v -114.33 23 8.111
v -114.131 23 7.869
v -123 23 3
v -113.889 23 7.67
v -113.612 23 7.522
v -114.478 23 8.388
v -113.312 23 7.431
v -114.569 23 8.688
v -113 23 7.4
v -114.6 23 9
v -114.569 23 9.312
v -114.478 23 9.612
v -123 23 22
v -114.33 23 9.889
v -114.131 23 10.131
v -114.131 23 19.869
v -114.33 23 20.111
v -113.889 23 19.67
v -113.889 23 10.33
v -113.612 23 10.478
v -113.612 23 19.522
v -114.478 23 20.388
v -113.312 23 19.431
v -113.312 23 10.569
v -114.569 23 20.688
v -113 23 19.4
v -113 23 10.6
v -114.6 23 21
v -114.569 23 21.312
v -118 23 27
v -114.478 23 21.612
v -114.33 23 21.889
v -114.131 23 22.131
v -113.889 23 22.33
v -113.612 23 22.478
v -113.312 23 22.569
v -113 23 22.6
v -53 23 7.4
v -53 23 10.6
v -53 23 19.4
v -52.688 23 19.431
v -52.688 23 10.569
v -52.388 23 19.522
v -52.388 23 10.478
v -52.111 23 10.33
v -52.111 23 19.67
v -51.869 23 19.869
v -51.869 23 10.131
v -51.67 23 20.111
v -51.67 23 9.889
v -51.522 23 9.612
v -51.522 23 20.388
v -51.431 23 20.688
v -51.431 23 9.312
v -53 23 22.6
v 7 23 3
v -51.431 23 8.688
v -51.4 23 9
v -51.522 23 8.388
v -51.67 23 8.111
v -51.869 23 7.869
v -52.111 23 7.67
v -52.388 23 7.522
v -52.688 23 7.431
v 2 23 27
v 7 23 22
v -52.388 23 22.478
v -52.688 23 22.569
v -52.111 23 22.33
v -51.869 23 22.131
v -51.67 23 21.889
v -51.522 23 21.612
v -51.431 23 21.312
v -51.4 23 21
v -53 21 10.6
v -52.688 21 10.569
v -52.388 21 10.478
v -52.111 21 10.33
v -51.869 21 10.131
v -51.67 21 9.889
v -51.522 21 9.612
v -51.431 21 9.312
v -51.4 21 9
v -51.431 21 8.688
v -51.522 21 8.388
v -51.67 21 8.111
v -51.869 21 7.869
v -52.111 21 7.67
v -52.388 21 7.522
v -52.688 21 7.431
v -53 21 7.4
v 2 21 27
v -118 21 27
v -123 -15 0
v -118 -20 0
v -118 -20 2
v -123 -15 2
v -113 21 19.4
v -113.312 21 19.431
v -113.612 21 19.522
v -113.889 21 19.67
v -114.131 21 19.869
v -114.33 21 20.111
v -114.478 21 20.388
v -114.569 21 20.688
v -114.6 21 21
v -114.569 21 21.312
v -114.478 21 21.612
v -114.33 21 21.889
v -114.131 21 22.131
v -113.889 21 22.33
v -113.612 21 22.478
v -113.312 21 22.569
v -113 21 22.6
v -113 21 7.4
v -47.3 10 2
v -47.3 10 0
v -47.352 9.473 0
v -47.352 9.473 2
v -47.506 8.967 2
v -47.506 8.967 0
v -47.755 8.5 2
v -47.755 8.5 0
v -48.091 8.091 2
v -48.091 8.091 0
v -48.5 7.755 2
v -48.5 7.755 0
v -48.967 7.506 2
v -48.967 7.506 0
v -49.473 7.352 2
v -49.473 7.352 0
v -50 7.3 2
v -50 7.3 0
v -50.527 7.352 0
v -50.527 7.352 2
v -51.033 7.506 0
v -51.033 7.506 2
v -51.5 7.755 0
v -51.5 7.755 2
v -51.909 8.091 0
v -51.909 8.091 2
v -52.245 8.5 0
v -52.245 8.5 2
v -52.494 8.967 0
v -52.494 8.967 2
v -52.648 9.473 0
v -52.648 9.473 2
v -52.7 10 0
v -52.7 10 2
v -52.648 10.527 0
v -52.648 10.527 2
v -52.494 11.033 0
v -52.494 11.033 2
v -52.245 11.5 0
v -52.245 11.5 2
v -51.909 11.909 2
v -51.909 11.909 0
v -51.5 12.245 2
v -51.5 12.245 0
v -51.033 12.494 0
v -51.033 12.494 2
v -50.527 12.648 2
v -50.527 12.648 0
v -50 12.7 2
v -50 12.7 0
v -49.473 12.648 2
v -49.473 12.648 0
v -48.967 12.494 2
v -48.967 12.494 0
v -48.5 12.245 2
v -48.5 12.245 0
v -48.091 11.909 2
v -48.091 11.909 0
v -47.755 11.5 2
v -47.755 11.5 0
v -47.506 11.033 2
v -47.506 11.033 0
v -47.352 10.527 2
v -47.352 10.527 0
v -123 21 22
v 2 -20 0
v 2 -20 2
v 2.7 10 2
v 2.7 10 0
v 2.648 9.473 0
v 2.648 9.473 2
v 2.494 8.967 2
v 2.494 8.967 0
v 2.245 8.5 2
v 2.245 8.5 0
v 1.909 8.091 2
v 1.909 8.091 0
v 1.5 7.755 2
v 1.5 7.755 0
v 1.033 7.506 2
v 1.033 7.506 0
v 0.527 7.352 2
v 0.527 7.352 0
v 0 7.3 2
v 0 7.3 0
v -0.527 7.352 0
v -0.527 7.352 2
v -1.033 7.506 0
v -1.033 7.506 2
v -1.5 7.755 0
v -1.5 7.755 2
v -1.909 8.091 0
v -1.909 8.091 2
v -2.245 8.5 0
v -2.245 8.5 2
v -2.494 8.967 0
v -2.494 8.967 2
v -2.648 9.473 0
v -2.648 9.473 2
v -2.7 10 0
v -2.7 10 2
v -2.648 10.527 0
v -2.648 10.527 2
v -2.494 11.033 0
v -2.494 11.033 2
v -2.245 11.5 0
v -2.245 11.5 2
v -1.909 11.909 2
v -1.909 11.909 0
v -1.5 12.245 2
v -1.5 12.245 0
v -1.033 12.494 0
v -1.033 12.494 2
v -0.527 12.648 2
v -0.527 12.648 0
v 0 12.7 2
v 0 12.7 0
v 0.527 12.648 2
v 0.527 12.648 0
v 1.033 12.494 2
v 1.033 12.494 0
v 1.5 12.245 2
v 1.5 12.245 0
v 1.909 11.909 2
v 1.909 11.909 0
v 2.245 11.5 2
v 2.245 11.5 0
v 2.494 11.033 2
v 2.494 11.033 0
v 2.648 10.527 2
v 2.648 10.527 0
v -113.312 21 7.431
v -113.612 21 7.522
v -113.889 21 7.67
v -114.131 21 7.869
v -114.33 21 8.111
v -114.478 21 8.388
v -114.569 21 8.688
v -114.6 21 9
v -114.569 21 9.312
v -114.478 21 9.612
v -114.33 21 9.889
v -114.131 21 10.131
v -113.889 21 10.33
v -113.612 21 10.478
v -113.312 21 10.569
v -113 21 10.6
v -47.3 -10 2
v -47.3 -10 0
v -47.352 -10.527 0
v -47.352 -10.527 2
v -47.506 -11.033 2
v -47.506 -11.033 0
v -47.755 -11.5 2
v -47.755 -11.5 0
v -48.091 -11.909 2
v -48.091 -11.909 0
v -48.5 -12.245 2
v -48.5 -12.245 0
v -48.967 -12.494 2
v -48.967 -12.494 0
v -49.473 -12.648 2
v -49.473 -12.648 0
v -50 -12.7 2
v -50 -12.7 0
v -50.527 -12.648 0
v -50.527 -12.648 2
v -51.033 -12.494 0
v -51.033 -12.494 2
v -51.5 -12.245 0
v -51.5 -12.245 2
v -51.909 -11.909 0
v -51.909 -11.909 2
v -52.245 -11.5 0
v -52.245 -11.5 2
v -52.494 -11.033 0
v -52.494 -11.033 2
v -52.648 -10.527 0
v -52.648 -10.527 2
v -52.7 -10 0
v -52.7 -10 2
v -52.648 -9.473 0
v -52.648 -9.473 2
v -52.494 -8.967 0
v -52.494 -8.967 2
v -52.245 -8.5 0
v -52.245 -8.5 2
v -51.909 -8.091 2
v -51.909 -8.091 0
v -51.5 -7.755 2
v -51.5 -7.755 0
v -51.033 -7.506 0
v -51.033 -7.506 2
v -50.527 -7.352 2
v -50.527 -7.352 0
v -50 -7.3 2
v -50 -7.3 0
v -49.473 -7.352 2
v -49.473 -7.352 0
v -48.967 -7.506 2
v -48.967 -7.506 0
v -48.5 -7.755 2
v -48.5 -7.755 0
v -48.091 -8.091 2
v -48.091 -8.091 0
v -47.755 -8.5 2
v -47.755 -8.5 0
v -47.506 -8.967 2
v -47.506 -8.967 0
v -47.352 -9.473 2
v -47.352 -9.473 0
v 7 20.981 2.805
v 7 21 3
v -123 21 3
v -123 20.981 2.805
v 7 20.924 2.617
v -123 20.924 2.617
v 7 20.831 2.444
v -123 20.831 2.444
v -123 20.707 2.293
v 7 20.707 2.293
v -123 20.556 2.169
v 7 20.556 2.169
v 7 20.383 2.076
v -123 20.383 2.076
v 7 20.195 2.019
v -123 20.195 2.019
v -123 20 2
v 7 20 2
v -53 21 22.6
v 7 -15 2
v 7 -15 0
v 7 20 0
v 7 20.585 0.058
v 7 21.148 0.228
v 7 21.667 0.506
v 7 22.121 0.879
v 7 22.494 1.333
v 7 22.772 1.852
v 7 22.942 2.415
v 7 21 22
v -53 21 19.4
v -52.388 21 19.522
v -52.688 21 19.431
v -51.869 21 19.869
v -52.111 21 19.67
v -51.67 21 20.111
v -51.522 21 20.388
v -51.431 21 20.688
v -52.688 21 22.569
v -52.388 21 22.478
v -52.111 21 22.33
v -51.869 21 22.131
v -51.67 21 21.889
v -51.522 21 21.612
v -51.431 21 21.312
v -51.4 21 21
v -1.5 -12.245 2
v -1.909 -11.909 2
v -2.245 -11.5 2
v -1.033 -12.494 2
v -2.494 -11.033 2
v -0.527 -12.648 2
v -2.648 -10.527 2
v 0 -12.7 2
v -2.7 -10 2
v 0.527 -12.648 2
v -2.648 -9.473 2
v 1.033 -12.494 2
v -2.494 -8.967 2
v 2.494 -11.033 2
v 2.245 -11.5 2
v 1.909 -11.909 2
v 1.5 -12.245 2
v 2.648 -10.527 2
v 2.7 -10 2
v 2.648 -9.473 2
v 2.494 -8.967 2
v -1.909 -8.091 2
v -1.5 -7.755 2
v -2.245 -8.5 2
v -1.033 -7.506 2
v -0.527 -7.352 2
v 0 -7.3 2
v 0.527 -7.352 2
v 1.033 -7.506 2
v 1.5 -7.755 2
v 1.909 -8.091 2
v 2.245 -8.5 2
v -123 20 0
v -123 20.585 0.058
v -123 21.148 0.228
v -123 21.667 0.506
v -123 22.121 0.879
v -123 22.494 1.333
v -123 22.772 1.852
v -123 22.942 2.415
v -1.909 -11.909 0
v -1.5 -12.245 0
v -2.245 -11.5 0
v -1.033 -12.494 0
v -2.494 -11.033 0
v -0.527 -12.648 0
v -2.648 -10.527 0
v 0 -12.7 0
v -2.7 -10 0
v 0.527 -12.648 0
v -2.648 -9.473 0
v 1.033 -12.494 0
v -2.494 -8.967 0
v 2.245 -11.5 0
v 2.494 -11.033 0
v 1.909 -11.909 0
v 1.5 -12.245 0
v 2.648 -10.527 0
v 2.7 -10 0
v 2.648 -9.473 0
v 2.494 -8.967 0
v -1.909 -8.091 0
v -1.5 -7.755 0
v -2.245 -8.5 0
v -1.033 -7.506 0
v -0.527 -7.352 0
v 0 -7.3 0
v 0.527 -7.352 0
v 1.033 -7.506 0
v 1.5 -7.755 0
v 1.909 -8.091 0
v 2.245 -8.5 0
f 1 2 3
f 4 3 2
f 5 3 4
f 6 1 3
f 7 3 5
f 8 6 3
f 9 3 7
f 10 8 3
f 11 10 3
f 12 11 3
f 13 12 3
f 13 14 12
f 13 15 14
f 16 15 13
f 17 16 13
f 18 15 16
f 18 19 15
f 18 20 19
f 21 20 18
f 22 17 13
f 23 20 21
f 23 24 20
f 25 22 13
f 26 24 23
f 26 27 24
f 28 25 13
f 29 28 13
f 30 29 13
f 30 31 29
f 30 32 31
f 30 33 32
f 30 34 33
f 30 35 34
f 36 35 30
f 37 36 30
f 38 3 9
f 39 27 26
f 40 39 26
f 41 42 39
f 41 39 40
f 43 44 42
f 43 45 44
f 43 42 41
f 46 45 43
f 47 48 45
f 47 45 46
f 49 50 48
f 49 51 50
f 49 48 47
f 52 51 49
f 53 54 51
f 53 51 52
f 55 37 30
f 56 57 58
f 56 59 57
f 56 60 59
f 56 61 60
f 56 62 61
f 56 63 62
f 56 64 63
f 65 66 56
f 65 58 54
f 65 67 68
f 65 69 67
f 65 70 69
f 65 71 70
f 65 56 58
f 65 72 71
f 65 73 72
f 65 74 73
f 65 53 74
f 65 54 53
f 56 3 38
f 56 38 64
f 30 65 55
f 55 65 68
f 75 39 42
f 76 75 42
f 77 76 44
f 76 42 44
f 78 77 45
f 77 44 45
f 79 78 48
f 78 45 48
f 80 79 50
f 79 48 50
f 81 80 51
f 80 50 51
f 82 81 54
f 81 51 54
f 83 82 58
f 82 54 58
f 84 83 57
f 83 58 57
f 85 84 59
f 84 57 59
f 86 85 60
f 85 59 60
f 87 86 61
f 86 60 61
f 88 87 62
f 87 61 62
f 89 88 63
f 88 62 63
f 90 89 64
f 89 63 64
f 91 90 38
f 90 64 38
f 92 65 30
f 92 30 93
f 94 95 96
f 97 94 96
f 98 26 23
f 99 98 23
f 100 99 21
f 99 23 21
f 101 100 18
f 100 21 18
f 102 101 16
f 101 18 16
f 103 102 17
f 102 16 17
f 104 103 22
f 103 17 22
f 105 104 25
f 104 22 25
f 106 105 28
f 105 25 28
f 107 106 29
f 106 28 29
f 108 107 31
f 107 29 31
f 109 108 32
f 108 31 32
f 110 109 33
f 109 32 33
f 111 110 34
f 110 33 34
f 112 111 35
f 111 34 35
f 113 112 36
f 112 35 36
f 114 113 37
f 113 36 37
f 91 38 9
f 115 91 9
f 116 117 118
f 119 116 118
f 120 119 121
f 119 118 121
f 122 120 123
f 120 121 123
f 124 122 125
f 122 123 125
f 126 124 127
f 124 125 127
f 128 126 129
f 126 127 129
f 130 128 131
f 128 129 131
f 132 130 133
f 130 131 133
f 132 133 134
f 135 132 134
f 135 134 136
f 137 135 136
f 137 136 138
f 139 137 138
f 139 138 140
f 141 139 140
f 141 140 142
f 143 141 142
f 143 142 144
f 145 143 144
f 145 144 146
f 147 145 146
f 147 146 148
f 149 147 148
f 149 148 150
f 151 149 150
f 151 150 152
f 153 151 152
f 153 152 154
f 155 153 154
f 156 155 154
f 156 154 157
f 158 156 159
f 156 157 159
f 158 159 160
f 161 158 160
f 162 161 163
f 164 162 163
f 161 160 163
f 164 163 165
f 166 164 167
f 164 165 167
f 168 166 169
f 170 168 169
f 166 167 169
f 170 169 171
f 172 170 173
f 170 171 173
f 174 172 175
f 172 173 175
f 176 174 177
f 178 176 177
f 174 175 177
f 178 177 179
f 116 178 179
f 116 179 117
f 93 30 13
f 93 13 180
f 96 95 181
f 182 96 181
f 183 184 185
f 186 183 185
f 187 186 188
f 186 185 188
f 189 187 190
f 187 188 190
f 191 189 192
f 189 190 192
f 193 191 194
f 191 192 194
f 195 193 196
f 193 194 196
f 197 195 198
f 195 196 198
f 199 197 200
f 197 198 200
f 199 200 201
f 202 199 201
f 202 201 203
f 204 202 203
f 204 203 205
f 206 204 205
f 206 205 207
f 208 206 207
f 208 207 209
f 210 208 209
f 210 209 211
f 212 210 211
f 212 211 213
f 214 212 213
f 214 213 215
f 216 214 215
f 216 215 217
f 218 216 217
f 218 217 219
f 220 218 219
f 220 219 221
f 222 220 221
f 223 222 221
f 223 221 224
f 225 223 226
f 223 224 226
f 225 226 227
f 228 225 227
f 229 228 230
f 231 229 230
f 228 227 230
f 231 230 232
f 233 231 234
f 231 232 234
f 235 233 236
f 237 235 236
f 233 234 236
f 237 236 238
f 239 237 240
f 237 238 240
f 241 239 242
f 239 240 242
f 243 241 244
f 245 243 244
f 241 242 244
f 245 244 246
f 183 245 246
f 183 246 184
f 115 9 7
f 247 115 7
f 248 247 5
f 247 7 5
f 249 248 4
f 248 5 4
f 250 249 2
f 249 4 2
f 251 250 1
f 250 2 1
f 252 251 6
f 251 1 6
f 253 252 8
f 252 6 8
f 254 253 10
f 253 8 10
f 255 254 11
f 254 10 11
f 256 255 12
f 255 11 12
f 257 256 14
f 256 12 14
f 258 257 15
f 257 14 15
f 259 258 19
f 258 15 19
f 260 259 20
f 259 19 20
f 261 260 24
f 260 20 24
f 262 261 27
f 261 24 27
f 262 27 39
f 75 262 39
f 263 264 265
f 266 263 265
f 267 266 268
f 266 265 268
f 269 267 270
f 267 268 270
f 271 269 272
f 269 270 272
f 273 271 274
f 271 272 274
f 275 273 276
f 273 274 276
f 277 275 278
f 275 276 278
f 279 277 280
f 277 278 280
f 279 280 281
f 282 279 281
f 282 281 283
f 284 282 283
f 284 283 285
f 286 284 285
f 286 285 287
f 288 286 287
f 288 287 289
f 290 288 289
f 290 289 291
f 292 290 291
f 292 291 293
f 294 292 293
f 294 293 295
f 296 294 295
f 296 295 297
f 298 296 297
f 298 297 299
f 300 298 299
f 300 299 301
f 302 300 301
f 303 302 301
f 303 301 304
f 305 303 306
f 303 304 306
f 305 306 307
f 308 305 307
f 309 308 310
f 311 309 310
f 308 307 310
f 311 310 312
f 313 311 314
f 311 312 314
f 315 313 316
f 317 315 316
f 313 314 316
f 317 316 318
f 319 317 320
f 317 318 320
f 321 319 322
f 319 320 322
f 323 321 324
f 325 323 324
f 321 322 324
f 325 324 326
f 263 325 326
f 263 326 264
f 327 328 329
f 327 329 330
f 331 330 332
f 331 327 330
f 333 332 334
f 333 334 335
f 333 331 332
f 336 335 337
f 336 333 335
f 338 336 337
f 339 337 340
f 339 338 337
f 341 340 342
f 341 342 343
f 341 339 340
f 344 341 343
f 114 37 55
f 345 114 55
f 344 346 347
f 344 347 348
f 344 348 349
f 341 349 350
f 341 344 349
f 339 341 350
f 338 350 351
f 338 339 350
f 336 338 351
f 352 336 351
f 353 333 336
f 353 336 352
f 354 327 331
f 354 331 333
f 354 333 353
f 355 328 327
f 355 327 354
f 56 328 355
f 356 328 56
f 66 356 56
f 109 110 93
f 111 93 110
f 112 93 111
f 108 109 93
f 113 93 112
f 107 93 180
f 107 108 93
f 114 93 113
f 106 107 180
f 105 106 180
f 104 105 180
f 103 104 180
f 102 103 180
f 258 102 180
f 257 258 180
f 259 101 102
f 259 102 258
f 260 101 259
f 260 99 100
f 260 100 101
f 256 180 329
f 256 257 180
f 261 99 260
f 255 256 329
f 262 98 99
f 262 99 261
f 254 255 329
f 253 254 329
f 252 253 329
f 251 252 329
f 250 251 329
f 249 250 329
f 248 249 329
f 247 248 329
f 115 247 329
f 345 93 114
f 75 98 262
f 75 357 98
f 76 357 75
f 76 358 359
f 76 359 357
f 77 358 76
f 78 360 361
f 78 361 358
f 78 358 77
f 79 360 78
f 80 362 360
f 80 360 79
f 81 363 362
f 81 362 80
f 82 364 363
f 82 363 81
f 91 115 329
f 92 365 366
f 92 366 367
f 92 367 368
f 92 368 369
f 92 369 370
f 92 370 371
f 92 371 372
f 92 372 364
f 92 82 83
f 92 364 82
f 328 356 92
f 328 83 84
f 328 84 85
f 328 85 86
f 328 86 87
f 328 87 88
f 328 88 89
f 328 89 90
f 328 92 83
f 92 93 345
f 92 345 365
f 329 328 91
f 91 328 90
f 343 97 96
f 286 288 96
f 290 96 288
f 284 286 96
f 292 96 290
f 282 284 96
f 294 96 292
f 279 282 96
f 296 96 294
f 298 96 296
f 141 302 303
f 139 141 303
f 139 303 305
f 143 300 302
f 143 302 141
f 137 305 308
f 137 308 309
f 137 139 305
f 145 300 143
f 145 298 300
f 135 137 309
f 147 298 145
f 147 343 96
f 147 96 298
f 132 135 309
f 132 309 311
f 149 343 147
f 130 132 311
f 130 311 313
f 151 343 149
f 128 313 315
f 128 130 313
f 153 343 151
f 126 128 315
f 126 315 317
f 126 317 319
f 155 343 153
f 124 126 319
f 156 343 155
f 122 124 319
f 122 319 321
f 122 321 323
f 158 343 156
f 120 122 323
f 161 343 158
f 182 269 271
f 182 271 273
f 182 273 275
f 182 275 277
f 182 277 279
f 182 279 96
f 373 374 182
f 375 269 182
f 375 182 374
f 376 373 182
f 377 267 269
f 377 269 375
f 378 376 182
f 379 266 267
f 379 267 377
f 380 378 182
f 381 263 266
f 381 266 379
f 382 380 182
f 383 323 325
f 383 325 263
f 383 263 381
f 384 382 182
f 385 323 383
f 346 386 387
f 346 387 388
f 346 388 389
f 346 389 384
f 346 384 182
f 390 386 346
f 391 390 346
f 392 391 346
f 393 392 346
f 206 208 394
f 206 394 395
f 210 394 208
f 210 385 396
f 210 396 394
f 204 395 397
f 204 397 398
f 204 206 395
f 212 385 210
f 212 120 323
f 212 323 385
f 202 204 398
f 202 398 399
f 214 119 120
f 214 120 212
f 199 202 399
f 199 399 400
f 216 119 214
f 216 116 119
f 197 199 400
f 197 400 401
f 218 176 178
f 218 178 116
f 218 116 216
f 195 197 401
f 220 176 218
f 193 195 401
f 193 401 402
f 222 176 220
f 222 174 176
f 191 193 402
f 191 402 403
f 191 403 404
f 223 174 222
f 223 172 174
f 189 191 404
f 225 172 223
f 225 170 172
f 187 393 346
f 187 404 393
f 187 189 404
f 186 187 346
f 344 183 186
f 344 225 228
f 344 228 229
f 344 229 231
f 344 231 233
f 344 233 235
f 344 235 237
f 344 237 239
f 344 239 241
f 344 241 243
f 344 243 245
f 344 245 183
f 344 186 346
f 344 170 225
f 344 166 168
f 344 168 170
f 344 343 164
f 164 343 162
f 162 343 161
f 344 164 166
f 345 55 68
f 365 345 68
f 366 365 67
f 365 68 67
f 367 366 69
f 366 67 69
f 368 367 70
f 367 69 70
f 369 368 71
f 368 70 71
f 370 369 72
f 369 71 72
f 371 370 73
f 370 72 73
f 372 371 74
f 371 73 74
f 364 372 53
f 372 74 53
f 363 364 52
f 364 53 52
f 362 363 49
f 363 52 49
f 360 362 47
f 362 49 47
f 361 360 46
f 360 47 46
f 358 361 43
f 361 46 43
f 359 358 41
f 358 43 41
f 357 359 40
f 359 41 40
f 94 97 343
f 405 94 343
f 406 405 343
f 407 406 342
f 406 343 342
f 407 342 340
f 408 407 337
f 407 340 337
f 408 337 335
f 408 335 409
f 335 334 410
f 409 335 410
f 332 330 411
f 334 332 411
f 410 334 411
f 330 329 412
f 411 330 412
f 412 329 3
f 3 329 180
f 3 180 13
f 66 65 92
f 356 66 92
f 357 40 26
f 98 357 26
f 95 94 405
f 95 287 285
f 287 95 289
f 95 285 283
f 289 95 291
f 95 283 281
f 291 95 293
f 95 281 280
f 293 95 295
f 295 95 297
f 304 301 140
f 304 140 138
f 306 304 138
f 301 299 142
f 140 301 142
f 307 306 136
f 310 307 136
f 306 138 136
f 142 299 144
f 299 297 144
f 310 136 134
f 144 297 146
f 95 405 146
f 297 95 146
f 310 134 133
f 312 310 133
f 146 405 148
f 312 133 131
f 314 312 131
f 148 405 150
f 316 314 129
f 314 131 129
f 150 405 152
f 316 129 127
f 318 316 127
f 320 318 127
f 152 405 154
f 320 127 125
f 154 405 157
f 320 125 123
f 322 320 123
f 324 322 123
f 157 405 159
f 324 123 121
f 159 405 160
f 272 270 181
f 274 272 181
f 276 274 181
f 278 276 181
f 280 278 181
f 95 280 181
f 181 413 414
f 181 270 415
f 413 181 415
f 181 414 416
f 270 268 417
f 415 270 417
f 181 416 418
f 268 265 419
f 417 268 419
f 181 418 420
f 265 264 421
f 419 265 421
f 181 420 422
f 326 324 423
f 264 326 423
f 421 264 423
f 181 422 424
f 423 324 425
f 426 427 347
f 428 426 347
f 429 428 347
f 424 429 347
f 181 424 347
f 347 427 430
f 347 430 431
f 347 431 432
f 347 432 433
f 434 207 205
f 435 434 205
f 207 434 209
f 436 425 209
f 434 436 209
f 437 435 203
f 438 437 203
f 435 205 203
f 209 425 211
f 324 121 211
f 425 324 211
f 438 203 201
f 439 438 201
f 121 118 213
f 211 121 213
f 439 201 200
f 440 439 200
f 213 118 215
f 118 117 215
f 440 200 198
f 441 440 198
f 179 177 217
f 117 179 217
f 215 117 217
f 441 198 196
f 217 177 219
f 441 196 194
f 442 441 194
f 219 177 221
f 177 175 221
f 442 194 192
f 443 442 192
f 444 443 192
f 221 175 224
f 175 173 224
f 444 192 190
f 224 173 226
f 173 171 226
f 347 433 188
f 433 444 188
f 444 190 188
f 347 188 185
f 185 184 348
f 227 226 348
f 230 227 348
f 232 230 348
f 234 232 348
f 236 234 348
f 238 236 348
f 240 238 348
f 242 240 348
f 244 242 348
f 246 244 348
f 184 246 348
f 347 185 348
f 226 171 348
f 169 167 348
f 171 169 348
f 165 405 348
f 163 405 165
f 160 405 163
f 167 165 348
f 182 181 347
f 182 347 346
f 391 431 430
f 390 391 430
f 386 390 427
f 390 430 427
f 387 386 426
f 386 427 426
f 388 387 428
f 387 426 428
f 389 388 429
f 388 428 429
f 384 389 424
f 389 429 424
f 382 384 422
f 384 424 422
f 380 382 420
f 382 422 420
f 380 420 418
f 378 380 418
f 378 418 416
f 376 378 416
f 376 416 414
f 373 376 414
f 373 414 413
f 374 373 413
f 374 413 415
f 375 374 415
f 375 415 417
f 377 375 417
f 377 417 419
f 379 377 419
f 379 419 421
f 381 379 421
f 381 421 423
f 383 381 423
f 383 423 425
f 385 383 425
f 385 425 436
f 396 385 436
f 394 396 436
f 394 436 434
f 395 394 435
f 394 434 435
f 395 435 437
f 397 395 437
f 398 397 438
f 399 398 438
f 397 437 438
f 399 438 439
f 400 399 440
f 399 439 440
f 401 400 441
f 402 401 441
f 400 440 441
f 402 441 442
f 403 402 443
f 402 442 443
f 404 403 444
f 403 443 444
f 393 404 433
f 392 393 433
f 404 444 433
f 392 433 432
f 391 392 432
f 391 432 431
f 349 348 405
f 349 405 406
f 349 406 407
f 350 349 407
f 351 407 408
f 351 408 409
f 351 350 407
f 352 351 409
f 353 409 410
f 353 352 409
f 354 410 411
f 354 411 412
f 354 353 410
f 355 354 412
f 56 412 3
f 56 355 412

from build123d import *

# Parameters (mm, degrees)
SKETCH_17_W             = 130
SKETCH_17_H             = 40
SM_BASE_FLANGE_1_DEPTH  = 2
HOLE_WIZARD_5_4_5_4_1_D = 5.4
SM_EDGE_FLANGE_1_DEPTH  = 130
CUT_EXTRUDE_4_REACH     = 135.822
CHAMFER_1_SIZE          = 5


# Sheet-metal steps are written as plain solids
with BuildPart() as part:
    # 草圖17 → 基材-凸緣1 (new body)
    with BuildSketch(Plane.XY):
        with Locations((-58, 0)):
            Rectangle(SKETCH_17_W, SKETCH_17_H)
    extrude(amount=SM_BASE_FLANGE_1_DEPTH)

    # Ø5.4 (5.4) 直徑孔1 (through all)
    with Locations(Plane(origin=(-278.067262353, 19.151419807, 2), x_dir=(-1, 0, 0), z_dir=(0, 0, 1))):
        with Locations((-228.067262353, 29.151419807), (-278.067262353, 29.151419807), (-228.067262353, 9.151419807), (-278.067262353, 9.151419807)):
            Hole(HOLE_WIZARD_5_4_5_4_1_D / 2)

    # 邊線-凸緣1 section (across the edge) → 邊線-凸緣1 (add)
    with BuildSketch(Plane(origin=(7, 21, 2), x_dir=(0, -1, 0), z_dir=(-1, 0, 0))):
        with BuildLine():
            Line((-2, 1), (-2, 25))
            Line((-2, 25), (0, 25))
            Line((0, 25), (0, 1))
            ThreePointArc((0, 1), (0.292893219, 0.292893219), (1, 0))
            Line((1, 0), (1, -2))
            ThreePointArc((1, -2), (-1.121320344, -1.121320344), (-2, 1))
        make_face()
    extrude(amount=SM_EDGE_FLANGE_1_DEPTH)

    # 草圖14 → 除料-伸長4 (cut, up to next)
    with BuildSketch(Plane(origin=(0, 23, 30.5), x_dir=(1, 0, 0), z_dir=(0, 1, 0)), mode=Mode.PRIVATE) as cut_extrude_4_sk1:
        with BuildLine():
            Line((-113, 19.9), (-53, 19.9))
            ThreePointArc((-53, 19.9), (-51.4, 21.5), (-53, 23.1))
            Line((-53, 23.1), (-113, 23.1))
            ThreePointArc((-113, 23.1), (-114.6, 21.5), (-113, 19.9))
        make_face()
    cut_extrude_4_tool1 = extrude(cut_extrude_4_sk1.sketch, amount=-CUT_EXTRUDE_4_REACH, mode=Mode.PRIVATE) & part.part
    # 草圖14 → 除料-伸長4 (cut, up to next)
    with BuildSketch(Plane(origin=(0, 23, 30.5), x_dir=(1, 0, 0), z_dir=(0, 1, 0)), mode=Mode.PRIVATE) as cut_extrude_4_sk2:
        with BuildLine():
            Line((-113, 7.9), (-53, 7.9))
            ThreePointArc((-53, 7.9), (-51.4, 9.5), (-53, 11.1))
            Line((-53, 11.1), (-113, 11.1))
            ThreePointArc((-113, 11.1), (-114.6, 9.5), (-113, 7.9))
        make_face()
    cut_extrude_4_tool2 = extrude(cut_extrude_4_sk2.sketch, amount=-CUT_EXTRUDE_4_REACH, mode=Mode.PRIVATE) & part.part
    add(cut_extrude_4_tool1.solids().sort_by_distance((-83, 23, 9))[0], mode=Mode.SUBTRACT)
    add(cut_extrude_4_tool2.solids().sort_by_distance((-83, 23, 21))[0], mode=Mode.SUBTRACT)

    # 導角1
    chamfer_1_edges = [part.edges().sort_by_distance(p)[0] for p in [
        (7, 22, 27),
        (-123, 22, 27),
        (7, -20, 1),
        (-123, -20, 1),
    ]]
    chamfer(chamfer_1_edges, length=CHAMFER_1_SIZE)


solid = part.part
